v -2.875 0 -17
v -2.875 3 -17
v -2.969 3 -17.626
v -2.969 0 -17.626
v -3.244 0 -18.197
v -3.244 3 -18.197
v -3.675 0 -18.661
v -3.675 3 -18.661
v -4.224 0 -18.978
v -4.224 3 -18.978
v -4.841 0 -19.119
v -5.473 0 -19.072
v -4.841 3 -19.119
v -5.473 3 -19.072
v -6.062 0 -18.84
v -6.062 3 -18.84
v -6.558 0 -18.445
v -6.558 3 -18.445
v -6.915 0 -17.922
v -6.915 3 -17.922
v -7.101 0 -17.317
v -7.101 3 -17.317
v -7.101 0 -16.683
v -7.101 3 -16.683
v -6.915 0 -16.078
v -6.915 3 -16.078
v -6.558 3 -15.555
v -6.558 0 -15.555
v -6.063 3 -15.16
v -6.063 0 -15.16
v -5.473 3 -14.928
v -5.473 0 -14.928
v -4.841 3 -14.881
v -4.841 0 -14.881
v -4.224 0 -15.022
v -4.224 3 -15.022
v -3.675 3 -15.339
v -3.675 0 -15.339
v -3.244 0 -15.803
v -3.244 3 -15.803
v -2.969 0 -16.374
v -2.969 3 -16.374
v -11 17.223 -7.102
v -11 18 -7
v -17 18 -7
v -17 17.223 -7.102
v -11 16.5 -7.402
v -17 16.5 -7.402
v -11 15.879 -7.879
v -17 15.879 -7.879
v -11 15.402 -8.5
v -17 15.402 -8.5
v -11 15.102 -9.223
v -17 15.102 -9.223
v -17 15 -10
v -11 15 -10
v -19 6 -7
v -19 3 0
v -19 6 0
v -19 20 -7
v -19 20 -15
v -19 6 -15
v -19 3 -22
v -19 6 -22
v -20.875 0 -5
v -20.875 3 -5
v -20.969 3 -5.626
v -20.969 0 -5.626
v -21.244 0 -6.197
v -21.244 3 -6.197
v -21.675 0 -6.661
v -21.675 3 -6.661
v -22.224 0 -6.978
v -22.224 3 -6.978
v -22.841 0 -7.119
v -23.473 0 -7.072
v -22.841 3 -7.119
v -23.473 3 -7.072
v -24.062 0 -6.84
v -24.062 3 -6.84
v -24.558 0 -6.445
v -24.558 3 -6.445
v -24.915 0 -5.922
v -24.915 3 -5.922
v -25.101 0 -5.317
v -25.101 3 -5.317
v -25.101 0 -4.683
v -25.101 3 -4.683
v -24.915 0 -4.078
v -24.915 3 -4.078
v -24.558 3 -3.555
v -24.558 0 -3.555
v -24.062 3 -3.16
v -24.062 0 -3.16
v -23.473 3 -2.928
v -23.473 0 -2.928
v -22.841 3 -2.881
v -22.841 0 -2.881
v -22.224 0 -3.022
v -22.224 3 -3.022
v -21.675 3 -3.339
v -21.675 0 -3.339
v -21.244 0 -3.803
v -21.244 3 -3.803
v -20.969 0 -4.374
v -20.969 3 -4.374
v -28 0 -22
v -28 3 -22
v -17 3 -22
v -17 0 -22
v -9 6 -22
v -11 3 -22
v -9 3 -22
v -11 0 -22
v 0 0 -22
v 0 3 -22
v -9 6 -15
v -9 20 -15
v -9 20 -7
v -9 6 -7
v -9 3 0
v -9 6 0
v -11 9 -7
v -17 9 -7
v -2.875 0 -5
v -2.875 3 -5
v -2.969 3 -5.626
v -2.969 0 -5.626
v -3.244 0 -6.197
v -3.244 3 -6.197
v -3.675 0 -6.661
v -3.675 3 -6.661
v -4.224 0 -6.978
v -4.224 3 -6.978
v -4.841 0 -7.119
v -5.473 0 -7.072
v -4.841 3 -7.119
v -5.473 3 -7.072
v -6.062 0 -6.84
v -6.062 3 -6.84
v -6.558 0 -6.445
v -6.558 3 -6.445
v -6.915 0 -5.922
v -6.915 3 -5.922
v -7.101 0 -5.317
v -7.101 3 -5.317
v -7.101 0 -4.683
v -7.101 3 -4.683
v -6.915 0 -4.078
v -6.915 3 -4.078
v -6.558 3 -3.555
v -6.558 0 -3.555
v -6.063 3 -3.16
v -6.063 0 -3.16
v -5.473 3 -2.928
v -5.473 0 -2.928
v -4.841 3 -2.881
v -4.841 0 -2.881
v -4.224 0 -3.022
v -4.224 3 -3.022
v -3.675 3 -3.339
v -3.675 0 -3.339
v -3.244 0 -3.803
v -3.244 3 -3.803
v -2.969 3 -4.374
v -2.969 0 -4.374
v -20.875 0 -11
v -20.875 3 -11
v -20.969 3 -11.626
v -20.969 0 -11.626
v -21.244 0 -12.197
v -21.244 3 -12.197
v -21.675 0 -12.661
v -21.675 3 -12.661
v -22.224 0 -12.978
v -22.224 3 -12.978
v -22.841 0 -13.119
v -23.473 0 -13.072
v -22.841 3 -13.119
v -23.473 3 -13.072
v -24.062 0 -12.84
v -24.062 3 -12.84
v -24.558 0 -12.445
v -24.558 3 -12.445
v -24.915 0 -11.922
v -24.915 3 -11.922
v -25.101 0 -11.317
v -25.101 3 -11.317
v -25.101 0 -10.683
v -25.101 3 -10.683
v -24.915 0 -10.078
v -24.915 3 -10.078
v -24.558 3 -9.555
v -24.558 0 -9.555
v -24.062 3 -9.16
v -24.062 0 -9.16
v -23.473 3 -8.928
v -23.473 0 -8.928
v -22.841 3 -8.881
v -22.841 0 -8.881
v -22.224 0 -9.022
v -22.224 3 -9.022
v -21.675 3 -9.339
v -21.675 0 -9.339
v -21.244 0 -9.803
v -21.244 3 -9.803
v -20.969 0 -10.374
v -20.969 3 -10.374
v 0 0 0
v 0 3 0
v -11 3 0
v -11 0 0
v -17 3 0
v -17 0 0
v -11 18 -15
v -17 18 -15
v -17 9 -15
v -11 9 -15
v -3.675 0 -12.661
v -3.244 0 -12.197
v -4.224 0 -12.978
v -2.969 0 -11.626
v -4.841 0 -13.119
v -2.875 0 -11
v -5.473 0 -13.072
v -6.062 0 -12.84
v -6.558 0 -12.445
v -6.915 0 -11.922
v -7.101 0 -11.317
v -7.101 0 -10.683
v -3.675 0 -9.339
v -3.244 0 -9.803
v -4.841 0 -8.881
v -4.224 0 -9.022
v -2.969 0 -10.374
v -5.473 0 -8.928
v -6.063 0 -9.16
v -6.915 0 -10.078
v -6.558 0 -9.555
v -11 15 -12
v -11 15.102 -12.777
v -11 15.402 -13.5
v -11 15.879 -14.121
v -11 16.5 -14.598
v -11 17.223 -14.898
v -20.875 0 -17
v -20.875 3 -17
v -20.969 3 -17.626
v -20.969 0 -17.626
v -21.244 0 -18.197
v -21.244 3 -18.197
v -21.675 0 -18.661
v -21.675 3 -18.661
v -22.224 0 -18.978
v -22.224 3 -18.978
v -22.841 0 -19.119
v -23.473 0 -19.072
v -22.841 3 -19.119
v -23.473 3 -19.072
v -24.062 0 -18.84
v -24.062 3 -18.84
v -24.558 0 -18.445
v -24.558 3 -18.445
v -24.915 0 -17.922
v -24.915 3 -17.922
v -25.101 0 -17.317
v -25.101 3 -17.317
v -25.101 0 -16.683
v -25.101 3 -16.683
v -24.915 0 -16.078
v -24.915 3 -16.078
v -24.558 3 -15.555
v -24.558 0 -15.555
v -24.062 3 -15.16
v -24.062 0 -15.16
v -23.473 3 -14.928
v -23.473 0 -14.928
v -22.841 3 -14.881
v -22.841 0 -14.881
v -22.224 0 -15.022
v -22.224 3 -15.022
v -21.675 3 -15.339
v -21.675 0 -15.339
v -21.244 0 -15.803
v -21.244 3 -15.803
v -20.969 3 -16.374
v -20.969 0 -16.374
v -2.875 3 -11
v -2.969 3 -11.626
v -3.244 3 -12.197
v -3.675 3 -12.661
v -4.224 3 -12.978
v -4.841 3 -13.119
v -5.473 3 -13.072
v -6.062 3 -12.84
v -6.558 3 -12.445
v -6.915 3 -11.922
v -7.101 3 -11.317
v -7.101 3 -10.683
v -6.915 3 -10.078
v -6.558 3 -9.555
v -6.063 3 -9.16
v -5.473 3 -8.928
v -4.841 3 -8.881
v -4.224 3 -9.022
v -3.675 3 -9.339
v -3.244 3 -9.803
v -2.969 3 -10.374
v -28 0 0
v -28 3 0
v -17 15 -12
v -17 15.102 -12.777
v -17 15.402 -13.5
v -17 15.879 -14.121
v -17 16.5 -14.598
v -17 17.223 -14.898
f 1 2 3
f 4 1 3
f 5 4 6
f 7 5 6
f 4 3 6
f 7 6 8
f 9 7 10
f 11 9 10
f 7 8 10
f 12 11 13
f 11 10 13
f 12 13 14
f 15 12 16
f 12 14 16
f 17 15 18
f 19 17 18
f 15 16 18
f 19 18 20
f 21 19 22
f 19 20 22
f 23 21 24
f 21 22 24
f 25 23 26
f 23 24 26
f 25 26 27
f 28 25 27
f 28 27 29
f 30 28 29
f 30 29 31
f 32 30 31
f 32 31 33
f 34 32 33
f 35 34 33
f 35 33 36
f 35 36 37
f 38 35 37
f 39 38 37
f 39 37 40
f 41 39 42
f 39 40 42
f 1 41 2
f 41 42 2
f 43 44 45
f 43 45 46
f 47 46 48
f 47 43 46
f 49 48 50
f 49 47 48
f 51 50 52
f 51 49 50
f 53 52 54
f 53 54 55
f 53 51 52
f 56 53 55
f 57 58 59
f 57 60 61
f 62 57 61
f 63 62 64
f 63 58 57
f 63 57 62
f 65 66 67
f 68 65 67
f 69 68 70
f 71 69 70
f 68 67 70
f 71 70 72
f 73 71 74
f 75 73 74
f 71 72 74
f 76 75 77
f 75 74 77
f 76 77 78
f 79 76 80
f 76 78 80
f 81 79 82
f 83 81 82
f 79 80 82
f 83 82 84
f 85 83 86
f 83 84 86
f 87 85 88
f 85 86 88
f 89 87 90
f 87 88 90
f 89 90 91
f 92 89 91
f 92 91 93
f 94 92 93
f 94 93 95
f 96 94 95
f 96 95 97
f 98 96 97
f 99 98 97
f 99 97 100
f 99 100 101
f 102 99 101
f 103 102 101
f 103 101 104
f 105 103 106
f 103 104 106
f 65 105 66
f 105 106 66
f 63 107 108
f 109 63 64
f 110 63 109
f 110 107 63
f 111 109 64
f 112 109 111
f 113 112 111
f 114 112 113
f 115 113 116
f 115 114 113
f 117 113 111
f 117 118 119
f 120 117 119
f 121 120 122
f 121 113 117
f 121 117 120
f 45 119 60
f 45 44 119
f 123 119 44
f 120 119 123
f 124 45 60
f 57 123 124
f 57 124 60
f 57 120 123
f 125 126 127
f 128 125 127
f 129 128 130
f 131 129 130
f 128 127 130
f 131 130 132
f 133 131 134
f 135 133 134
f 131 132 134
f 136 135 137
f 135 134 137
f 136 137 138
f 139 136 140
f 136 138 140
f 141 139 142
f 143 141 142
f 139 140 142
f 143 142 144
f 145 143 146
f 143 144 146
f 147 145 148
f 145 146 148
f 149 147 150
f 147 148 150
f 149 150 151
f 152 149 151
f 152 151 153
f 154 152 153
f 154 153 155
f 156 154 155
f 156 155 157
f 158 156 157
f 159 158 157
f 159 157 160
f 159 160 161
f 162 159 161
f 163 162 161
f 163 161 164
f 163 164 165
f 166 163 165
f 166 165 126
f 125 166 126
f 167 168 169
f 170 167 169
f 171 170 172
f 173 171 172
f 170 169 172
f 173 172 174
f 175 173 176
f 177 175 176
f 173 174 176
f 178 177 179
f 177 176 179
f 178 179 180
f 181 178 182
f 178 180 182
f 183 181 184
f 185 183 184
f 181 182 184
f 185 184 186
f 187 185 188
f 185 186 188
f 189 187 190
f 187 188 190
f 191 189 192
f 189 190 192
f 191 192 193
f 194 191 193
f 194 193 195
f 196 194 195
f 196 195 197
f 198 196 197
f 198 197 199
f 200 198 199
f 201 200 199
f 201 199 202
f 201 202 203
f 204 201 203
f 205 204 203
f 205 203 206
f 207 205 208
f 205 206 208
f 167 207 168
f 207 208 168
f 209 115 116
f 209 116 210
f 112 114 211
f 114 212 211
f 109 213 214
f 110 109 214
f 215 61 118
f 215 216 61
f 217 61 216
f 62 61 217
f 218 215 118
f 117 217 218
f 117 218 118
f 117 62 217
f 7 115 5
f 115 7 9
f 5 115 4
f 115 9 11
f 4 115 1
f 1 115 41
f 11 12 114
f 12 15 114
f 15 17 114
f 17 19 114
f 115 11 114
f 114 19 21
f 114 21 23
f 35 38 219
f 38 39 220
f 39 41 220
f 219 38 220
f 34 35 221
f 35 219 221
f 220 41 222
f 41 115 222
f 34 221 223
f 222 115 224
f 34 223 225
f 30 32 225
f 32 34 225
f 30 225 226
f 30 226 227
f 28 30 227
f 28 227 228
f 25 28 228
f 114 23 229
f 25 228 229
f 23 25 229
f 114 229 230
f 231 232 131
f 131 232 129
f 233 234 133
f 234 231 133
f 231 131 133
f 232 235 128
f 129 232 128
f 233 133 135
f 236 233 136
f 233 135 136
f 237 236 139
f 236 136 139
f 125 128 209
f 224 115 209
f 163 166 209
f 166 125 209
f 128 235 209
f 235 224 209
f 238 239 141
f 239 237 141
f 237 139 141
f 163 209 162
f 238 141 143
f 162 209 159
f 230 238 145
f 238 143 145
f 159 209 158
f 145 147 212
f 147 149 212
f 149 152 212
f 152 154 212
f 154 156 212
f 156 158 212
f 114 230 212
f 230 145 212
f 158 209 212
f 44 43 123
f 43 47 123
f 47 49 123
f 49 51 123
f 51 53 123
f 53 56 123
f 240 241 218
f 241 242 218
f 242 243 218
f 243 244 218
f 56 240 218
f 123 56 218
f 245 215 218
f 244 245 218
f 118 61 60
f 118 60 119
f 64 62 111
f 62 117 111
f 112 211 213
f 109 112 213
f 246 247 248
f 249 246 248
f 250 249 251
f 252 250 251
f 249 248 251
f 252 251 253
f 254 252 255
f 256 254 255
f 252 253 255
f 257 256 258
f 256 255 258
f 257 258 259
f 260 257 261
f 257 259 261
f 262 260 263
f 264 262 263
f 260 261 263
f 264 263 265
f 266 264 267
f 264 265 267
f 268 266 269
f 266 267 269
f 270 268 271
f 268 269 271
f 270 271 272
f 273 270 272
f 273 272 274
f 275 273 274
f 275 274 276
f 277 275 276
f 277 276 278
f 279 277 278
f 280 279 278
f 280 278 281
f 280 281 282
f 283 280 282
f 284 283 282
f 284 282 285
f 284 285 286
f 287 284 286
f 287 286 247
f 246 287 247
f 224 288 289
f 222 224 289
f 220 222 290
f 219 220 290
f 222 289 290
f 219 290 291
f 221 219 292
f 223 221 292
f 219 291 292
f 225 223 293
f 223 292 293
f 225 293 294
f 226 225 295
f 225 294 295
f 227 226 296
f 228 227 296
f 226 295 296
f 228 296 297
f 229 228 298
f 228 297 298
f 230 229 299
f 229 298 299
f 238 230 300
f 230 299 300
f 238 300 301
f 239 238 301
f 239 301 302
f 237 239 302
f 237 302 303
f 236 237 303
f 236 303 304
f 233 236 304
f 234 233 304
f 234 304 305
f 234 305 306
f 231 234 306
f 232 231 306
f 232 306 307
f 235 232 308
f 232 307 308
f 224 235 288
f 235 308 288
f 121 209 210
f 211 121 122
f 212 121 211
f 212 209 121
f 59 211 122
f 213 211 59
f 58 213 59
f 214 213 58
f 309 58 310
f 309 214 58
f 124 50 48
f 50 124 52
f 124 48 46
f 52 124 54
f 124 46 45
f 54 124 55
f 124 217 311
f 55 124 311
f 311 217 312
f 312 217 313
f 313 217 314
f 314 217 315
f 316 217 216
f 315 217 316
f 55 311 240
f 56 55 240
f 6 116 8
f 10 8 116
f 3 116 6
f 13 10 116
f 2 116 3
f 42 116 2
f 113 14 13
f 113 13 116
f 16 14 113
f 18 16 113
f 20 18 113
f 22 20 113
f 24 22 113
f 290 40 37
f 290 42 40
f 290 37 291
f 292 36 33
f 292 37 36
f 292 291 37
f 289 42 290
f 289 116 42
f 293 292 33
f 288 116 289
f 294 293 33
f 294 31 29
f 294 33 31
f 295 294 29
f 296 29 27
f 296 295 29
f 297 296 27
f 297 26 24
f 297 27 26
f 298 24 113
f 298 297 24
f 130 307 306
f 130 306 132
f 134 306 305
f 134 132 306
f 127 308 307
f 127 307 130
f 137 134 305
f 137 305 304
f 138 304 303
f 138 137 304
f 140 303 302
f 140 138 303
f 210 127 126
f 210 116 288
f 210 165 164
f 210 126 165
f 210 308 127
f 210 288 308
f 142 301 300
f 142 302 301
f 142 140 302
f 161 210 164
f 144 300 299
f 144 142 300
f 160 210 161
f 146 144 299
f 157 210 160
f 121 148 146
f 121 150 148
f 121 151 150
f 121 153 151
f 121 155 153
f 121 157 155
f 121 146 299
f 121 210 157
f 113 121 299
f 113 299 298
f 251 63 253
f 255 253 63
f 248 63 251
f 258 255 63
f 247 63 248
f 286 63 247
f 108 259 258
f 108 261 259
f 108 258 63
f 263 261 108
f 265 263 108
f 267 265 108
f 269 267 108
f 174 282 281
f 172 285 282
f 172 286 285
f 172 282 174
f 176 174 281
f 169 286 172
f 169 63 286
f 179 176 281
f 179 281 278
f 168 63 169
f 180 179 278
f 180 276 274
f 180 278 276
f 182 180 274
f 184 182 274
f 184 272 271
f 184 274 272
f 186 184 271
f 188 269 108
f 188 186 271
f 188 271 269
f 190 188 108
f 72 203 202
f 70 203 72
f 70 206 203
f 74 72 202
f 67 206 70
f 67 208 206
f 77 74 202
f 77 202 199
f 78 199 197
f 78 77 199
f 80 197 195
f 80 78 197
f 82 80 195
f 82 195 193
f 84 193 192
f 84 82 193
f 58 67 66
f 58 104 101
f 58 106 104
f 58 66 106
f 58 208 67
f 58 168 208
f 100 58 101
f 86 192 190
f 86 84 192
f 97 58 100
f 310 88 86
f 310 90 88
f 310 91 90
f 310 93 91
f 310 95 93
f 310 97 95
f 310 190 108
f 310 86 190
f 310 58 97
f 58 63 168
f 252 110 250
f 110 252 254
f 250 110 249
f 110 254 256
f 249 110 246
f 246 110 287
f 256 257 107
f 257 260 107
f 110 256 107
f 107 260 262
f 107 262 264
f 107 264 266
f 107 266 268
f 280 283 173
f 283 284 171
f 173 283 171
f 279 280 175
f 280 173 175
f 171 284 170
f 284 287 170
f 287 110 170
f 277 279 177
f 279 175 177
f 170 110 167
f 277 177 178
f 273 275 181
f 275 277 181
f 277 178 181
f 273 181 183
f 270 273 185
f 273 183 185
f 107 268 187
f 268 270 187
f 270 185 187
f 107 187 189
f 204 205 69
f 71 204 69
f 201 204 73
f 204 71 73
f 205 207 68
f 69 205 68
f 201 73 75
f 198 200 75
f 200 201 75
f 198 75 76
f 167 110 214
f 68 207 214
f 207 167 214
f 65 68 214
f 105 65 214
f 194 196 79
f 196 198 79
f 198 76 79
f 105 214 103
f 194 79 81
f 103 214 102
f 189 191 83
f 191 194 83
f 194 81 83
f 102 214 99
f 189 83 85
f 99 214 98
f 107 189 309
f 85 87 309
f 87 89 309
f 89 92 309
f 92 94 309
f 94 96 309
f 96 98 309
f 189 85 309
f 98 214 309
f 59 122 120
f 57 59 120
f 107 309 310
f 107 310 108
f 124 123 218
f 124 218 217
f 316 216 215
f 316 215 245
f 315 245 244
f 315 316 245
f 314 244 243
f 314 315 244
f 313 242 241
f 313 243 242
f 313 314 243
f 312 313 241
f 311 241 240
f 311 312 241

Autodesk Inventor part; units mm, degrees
ref_plane "YZ Plane" through (0, 0, 0) normal (1, 0, 0) x (0, 1, 0)
ref_plane "XZ Plane" through (0, 0, 0) normal (0, 1, 0) x (-1, 0, 0)
ref_plane "XY Plane" through (0, 0, 0) normal (0, 0, 1) x (1, 0, 0)
sketch "Sketch1" plane through (0, 0, 0) normal (0, 1, 0) x (-1, 0, 0)
  line L0 (0, 0) -> (28, 0)
  line L1 (28, 0) -> (28, -22)
  line L2 (28, -22) -> (0, -22)
  line L3 (0, -22) -> (0, 0)
  dimension "d0" = 28
  dimension "d1" = 22
extrude "Extrusion1" add sketch "Sketch1" along normal blind 3
sketch "Sketch2" plane through (0, 3, 0) normal (0, 1, 0) x (1, 0, 0)
  line L0 (-17, 7) -> (-11, 7)
  line L1 (-11, 7) -> (-11, 15)
  line L2 (-11, 15) -> (-17, 15)
  line L3 (-17, 15) -> (-17, 7)
  line L4 (-17, 7) -> (-11, 15) construction
  line L5 (-11, 7) -> (-17, 15) construction
  point P0 (0, 0)
  point P1 (-14, 11)
  dimension "d4" = 6
  dimension "d5" = 8
sketch "Sketch3" plane through (0, 3, 0) normal (0, 1, 0) x (1, 0, 0)
  line L0 (-28, 22) -> (-28, 0) projected
  line L1 (-28, 11) -> (-23, 11)
  line L2 (0, 0) -> (0, 22) projected
  line L3 (0, 11) -> (-5, 11)
  circle A0 centre (-5, 11) radius 2.125
  dimension "d6" = 5
  dimension "d7" = 5
  dimension "d8" = 4.25
extrude "Extrusion2" cut sketch "Sketch3" against normal through all
pattern_linear "Rectangular Pattern1" count 3 spacing 6 along (0, 0, 1) count 2 spacing 18 along (-1, 0, 0) of "Extrusion2" first direction both ways yes
sketch "Sketch5" plane through (0, 3, 0) normal (0, 1, 0) x (1, 0, 0)
  line L0 (0, 22) -> (-28, 22) projected
  line L1 (-19, 0) -> (-9, 0)
  line L2 (-9, 0) -> (-9, 22)
  line L3 (-9, 22) -> (-19, 22)
  line L4 (-19, 22) -> (-19, 0)
  line L5 (-19, 0) -> (-9, 22) construction
  line L6 (-9, 0) -> (-19, 22) construction
  point P0 (0, 0)
  point P1 (-14, 11)
  dimension "d17" = 10
extrude "Extrusion3" add sketch "Sketch5" along normal blind 15
sketch "Sketch6" plane through (-28, 0, 0) normal (0, 0, 1) x (1, 0, 0)
  line L0 (19, 3) -> (17, 3)
  line L1 (9, 3) -> (9, 18) projected
  line L2 (9, 3) -> (11, 3)
  line L3 (0, 0) -> (28, 0) projected
  line L4 (17, 3) -> (11, 3)
  line L5 (11, 3) -> (11, 0)
  line L6 (11, 0) -> (17, 0)
  line L7 (17, 0) -> (17, 3)
  dimension "d20" = 2
  dimension "d21" = 2
extrude "Extrusion4" cut sketch "Sketch6" against normal through all
sketch "Sketch7" plane through (-9, 3, 0) normal (1, 0, 0) x (0, 0, -1)
  line L0 (0, 15) -> (7, 15)
  line L1 (22, 15) -> (0, 15) projected
  line L2 (22, 15) -> (15, 15)
  line L3 (0, 0) -> (0, 15) projected
  line L4 (7, 15) -> (0, 15)
  line L5 (0, 15) -> (0, 3)
  line L6 (0, 3) -> (7, 3)
  line L7 (7, 3) -> (7, 15)
  line L8 (22, 15) -> (15, 15)
  line L9 (15, 15) -> (15, 3)
  line L10 (15, 3) -> (22, 3)
  line L11 (22, 3) -> (22, 15)
  point P0 (0, -3)
  dimension "d24" = 7
  dimension "d25" = 7
  dimension "d26" = 12
extrude "Extrusion5" cut sketch "Sketch7" against normal through all
sketch "Sketch8" plane through (-9, 6, -15) normal (0, 0, -1) x (-1, 0, 0)
  line L0 (0, 12) -> (10, 12) projected
  line L1 (5, 12) -> (5, 6)
  line L2 (10, 12) -> (10, 0) projected
  line L3 (10, 6) -> (6, 6)
  line L4 (0, 0) -> (0, 12) projected
  line L5 (0, 6) -> (4, 6)
  line L6 (2, 3) -> (8, 3)
  line L7 (8, 3) -> (8, 9)
  line L8 (8, 9) -> (2, 9)
  line L9 (2, 9) -> (2, 3)
  line L10 (2, 3) -> (8, 9) construction
  line L11 (8, 3) -> (2, 9) construction
  point P0 (-9, -6)
  dimension "d29" = 6
  dimension "d30" = 4
  dimension "d31" = 4
extrude "Extrusion6" cut sketch "Sketch8" against normal through all contours L8 L7 L6 L9
fillet "Fillet1" radius 3 1 edges at (-14, 15, -7)
fillet "Fillet2" radius 3 1 edges at (-14, 15, -15)
sketch "Sketch9" plane through (0, 18, 0) normal (0, 1, 0) x (1, 0, 0)
  line L0 (-9, 7) -> (-19, 7)
  line L1 (-19, 7) -> (-19, 15)
  line L2 (-19, 15) -> (-9, 15)
  line L3 (-9, 15) -> (-9, 7)
  line L4 (-9, 7) -> (-19, 15) construction
  line L5 (-19, 7) -> (-9, 15) construction
  point P0 (0, 0)
  point P1 (-14, 11)
extrude "Extrusion7" add sketch "Sketch9" along normal blind 2
properties part number "ClawAttach"
